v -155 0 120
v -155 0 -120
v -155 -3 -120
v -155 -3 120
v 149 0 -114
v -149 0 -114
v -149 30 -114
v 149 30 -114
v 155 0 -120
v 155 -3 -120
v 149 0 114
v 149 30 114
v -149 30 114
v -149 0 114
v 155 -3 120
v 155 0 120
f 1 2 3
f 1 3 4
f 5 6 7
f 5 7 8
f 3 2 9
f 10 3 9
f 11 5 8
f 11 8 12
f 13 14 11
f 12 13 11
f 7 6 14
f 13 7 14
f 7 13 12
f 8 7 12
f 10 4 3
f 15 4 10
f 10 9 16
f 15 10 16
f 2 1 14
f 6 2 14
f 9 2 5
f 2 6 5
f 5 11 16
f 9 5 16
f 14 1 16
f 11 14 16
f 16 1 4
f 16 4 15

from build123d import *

# Parameters (mm, degrees)
F1_W     = 298
F1_H     = 228
F2_DEPTH = 30
F0_W     = 310
F0_H     = 240
F3_DEPTH = 3


with BuildPart() as f2:
    # F1 (on face) → F2 (new body)
    with BuildSketch(Plane.XZ):
        Rectangle(F1_W, F1_H)
    extrude(amount=-F2_DEPTH)

    # F0 (on Front) → F3 (join)
    with BuildSketch(Plane.XZ):
        Rectangle(F0_W, F0_H)
    extrude(amount=F3_DEPTH)


solid = f2.part
